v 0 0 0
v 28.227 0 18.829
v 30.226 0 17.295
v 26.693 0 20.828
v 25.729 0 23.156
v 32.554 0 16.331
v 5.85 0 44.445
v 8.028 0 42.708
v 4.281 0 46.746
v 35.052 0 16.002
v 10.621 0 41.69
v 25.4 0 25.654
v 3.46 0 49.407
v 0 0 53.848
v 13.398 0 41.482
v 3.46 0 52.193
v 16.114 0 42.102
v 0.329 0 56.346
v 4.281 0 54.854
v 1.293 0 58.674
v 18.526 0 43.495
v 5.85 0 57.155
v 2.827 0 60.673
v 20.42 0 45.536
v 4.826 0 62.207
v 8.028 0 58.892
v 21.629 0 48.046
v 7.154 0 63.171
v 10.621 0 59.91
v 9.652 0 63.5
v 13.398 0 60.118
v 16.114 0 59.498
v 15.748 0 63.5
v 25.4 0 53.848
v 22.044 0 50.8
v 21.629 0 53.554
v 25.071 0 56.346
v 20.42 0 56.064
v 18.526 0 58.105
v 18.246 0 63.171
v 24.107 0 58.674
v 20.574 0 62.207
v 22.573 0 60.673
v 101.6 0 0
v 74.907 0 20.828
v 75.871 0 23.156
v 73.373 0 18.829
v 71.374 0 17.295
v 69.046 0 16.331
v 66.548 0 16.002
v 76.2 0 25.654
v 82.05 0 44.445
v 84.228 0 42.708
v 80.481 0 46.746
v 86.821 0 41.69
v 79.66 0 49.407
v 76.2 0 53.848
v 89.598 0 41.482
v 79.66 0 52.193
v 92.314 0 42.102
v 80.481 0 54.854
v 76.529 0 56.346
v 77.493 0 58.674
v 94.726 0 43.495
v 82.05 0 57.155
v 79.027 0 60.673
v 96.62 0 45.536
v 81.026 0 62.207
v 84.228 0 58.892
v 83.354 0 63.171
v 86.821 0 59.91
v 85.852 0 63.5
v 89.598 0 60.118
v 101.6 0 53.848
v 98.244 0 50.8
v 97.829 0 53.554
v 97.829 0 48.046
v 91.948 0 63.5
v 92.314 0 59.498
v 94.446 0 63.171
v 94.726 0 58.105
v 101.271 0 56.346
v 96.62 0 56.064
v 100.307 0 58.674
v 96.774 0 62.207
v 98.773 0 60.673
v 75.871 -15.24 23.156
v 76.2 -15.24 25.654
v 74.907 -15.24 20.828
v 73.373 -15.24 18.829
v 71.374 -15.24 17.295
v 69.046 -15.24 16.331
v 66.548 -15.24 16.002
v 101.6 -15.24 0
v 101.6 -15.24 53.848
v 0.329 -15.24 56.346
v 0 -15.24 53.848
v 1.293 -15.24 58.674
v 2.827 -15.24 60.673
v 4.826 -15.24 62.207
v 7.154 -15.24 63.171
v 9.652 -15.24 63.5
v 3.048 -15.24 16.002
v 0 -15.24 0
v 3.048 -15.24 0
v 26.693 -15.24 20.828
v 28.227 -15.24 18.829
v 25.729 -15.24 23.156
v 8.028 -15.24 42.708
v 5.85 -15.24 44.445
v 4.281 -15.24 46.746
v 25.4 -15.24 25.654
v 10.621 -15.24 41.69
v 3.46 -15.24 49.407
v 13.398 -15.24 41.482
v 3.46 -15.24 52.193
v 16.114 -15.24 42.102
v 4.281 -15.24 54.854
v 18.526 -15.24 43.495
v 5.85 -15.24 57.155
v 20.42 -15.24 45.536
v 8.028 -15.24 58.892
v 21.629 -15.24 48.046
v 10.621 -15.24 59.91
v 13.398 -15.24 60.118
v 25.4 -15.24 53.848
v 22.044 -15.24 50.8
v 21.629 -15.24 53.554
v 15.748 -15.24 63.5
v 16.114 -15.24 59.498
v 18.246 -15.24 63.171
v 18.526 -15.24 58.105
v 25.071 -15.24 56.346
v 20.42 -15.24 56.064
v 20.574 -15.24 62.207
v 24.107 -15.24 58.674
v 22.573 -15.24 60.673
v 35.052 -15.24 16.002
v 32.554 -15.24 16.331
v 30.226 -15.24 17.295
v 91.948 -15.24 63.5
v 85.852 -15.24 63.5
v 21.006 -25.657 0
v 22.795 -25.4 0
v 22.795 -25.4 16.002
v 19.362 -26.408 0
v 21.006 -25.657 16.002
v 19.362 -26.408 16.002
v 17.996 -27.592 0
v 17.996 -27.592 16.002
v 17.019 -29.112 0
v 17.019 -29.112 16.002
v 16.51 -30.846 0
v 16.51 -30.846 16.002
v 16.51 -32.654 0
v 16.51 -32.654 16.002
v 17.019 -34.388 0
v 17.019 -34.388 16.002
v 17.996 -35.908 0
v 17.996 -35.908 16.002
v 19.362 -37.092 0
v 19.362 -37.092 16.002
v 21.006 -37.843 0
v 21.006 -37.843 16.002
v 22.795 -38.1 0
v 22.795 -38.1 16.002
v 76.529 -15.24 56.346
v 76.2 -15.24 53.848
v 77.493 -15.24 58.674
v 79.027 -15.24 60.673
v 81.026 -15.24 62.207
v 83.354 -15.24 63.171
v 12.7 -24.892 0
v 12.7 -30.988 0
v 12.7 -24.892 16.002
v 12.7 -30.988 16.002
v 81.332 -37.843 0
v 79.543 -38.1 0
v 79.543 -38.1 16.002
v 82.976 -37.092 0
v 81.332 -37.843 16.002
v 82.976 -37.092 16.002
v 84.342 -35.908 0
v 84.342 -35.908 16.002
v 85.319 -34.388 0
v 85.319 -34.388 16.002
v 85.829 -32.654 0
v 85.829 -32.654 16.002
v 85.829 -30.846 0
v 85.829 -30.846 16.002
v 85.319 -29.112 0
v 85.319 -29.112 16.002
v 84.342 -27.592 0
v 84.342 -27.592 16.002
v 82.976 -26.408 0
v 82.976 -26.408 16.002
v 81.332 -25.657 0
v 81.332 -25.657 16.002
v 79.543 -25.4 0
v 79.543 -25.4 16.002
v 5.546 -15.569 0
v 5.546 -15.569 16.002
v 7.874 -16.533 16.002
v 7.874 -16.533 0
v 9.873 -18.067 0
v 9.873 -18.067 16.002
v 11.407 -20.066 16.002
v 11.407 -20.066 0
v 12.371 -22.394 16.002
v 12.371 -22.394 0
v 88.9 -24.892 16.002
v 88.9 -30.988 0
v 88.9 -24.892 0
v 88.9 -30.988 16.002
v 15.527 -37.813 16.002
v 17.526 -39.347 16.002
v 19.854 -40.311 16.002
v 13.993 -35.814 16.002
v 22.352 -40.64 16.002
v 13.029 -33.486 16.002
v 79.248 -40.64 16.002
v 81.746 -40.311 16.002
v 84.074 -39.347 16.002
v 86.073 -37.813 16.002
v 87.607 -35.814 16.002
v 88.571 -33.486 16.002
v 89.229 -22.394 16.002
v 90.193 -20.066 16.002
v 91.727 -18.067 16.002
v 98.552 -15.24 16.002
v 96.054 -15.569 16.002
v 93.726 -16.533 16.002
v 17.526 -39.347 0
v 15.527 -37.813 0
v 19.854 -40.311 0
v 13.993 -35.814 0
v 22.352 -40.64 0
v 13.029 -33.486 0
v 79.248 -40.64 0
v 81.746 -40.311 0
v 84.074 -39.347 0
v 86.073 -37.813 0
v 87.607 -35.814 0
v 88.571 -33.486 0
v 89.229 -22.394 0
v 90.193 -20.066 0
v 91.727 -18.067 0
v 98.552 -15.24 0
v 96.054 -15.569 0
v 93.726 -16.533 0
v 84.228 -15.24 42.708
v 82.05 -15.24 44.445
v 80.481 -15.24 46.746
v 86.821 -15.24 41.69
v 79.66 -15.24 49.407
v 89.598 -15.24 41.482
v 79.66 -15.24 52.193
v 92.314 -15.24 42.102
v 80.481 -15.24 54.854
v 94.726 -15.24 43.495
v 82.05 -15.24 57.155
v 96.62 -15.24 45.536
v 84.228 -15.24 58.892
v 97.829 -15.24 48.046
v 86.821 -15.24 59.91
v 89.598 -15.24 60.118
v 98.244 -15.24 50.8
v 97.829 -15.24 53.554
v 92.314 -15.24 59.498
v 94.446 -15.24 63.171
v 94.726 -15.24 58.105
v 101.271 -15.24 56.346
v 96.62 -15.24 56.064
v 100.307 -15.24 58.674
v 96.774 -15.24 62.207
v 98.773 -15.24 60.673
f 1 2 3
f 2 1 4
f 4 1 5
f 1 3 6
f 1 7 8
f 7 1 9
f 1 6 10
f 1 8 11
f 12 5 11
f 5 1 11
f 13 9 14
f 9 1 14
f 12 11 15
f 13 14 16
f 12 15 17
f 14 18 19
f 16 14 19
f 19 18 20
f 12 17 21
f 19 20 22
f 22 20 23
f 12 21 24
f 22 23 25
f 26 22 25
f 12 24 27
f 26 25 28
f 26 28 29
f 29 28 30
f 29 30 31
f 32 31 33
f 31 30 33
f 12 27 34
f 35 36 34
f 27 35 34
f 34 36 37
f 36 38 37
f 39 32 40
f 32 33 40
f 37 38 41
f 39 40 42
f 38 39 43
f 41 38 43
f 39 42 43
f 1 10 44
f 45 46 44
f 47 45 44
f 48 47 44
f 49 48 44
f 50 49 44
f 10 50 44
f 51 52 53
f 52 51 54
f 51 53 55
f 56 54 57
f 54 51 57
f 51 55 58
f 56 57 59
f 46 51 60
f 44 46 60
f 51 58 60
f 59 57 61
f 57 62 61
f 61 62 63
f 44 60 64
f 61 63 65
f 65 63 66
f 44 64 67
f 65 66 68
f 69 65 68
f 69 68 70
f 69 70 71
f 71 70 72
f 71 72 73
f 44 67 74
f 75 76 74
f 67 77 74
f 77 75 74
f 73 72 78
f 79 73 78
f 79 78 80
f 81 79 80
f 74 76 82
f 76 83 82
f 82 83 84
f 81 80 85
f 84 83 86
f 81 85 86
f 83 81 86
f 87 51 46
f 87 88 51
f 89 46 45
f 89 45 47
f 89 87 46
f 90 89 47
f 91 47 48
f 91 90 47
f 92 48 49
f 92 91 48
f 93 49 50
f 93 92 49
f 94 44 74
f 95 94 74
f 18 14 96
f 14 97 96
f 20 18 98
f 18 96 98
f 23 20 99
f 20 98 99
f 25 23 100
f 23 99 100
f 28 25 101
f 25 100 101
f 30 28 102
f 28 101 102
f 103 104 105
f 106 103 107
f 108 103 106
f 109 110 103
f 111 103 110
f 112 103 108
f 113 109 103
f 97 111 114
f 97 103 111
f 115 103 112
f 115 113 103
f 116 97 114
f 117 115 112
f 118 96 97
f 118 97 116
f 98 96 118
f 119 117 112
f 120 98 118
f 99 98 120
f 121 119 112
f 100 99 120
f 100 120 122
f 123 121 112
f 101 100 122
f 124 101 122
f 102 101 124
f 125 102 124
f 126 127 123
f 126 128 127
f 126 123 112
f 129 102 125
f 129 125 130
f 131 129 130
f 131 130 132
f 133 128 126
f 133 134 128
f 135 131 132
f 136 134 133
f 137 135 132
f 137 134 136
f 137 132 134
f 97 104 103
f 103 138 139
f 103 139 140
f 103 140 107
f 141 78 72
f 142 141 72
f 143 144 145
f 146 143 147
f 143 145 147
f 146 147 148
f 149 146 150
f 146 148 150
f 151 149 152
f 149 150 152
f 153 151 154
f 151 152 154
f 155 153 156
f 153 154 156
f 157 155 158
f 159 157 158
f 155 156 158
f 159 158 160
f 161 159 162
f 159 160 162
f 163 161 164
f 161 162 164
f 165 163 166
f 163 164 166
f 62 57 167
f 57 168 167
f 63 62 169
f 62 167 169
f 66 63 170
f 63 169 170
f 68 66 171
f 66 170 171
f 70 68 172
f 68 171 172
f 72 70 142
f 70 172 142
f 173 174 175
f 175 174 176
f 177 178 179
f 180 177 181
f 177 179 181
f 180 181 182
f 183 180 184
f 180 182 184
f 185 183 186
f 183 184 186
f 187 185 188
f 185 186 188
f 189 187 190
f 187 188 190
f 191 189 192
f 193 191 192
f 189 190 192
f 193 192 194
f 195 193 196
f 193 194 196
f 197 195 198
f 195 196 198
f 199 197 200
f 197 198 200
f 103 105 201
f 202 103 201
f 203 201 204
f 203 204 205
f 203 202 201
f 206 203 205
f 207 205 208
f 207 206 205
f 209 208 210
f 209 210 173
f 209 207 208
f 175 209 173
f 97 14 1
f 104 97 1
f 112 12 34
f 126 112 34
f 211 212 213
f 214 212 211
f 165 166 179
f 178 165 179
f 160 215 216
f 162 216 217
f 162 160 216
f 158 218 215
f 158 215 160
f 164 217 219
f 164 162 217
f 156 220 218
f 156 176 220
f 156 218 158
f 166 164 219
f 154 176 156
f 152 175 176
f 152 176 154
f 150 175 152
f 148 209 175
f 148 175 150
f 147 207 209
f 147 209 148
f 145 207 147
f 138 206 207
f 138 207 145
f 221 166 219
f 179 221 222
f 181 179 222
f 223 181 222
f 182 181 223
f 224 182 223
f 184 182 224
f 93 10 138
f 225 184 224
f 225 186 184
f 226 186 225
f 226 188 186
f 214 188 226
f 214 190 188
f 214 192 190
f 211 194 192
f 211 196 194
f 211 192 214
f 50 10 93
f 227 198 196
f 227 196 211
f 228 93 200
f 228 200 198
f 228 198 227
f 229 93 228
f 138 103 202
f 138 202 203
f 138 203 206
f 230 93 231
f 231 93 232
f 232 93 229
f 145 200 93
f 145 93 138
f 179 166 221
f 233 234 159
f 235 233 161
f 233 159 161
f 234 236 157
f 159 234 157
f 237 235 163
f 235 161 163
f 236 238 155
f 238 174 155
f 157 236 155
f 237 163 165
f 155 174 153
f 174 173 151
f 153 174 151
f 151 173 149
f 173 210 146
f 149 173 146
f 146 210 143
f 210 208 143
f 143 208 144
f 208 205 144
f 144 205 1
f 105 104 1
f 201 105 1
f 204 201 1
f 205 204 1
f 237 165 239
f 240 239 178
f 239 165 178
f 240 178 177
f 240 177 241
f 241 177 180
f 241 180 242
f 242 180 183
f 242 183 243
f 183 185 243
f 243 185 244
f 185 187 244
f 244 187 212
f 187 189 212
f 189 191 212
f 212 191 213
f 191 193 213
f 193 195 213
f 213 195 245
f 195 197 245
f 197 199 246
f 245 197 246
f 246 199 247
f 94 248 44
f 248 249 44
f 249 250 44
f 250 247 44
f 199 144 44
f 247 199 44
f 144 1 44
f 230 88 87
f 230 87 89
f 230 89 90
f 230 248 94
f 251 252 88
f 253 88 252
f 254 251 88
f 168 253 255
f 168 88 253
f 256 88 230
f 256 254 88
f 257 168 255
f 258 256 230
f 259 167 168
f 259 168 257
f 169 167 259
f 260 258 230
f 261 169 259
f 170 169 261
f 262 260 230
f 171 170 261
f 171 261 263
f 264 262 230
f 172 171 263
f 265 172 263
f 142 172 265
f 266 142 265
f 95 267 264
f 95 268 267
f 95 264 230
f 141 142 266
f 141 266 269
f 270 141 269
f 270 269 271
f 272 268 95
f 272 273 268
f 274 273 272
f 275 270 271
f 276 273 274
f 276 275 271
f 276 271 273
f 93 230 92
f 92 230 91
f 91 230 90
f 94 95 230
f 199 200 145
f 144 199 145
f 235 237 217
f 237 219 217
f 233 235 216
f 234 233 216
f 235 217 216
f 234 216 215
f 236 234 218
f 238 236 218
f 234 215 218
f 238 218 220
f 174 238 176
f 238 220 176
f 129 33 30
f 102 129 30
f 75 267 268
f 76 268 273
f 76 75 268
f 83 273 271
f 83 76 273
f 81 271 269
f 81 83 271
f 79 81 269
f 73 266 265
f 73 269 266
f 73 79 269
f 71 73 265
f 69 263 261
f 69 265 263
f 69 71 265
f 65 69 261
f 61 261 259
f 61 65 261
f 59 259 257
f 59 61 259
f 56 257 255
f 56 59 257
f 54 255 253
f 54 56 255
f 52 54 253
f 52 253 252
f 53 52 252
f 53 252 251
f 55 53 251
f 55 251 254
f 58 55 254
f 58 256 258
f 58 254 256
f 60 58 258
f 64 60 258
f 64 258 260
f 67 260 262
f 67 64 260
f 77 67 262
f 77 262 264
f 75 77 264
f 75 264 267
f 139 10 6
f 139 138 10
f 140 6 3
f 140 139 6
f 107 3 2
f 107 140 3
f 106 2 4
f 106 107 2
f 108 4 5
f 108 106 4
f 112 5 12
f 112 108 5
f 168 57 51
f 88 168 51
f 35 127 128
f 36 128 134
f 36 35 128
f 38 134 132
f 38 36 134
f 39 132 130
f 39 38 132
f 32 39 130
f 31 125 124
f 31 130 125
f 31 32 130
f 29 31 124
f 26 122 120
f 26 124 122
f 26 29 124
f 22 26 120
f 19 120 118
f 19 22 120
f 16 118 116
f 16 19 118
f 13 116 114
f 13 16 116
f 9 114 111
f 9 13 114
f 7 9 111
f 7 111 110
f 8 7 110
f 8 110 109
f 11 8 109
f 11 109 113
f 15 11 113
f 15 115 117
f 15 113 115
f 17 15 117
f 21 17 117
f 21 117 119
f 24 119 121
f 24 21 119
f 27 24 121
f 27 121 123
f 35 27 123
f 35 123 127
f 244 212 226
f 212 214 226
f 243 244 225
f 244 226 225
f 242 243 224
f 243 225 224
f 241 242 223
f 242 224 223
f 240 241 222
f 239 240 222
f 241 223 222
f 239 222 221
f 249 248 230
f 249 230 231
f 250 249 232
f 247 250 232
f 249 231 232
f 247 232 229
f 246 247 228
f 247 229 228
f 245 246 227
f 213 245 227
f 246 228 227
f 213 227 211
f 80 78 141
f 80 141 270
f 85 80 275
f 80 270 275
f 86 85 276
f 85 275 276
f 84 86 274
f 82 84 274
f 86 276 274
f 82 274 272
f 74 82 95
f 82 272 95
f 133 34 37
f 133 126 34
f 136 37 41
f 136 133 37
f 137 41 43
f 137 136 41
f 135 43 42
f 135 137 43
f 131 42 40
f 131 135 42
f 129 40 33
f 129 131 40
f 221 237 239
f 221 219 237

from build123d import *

# Parameters (mm, degrees)
F2_DEPTH  = 40.64
F1_R      = 9.3438702408
F3_DEPTH  = 40.641
F5_START  = 16.002
F4_W      = 101.6
F4_H      = 25.4
F5_DEPTH  = 47.499
F6_W      = 12.7
F6_H      = 16.002
F7_DEPTH  = 25.4
F8_R      = 9.652
F9_R      = 9.652
F11_DEPTH = 16.003
F12_R     = 9.652


with BuildPart() as f2:
    # F0 (on Front) → F2 (new body)
    with BuildSketch(Plane.XZ):
        Polygon((0, 63.5), (0, 0), (101.6, 0), (101.6, 63.5), (76.2, 63.5), (76.2, 16.002), (25.4, 16.002), (25.4, 63.5), align=None)
    extrude(amount=F2_DEPTH)

    # F1 (on face) → F3 (cut, through all)
    with BuildSketch(Plane.XZ):
        with Locations((12.7, 50.8)):
            Circle(F1_R)
        with Locations((88.9, 50.8)):
            Circle(F1_R)
    extrude(amount=F3_DEPTH, mode=Mode.SUBTRACT)

    # F4 (on Top) → F5 (cut)
    with BuildSketch(Plane.XY.offset(F5_START)):
        with Locations((50.8, -27.94)):
            Rectangle(F4_W, F4_H)
    extrude(amount=F5_DEPTH, mode=Mode.SUBTRACT)

    # F6 (on face) → F7 (cut)
    with BuildSketch(Plane.XZ.offset(40.64)):
        with Locations((6.35, 8.001)):
            Rectangle(F6_W, F6_H)
        with Locations((95.25, 8.001)):
            Rectangle(F6_W, F6_H)
    extrude(amount=-F7_DEPTH, mode=Mode.SUBTRACT)

    # F8
    f8_edges = [f2.edges().sort_by_distance(p)[0] for p in [
        (25.4, -7.62, 63.5),
        (0, -7.62, 63.5),
        (76.2, -7.62, 63.5),
        (101.6, -7.62, 63.5),
    ]]
    fillet(f8_edges, radius=F8_R)

    # F9
    f9_edges = [f2.edges().sort_by_distance(p)[0] for p in [
        (12.7, -40.64, 8.001),
        (88.9, -40.64, 8.001),
        (12.7, -15.24, 8.001),
        (88.9, -15.24, 8.001),
    ]]
    fillet(f9_edges, radius=F9_R)

    # F10 (on face) → F11 (cut, through all)
    with BuildSketch(Plane.XY.offset(16.002)):
        with BuildLine():
            ThreePointArc((22.7949339896, -25.4), (16.4449339896, -31.75), (22.7949339896, -38.1))
            Line((22.7949339896, -38.1), (79.5431733131, -38.1))
            ThreePointArc((79.5431733131, -38.1), (85.8931733131, -31.75), (79.5431733131, -25.4))
            Line((79.5431733131, -25.4), (22.7949339896, -25.4))
        make_face()
    extrude(amount=-F11_DEPTH, mode=Mode.SUBTRACT)

    # F12
    f12_edges = [f2.edges().sort_by_distance(p)[0] for p in [
        (25.4, -7.62, 16.002),
        (76.2, -7.62, 16.002),
    ]]
    fillet(f12_edges, radius=F12_R)


solid = f2.part
